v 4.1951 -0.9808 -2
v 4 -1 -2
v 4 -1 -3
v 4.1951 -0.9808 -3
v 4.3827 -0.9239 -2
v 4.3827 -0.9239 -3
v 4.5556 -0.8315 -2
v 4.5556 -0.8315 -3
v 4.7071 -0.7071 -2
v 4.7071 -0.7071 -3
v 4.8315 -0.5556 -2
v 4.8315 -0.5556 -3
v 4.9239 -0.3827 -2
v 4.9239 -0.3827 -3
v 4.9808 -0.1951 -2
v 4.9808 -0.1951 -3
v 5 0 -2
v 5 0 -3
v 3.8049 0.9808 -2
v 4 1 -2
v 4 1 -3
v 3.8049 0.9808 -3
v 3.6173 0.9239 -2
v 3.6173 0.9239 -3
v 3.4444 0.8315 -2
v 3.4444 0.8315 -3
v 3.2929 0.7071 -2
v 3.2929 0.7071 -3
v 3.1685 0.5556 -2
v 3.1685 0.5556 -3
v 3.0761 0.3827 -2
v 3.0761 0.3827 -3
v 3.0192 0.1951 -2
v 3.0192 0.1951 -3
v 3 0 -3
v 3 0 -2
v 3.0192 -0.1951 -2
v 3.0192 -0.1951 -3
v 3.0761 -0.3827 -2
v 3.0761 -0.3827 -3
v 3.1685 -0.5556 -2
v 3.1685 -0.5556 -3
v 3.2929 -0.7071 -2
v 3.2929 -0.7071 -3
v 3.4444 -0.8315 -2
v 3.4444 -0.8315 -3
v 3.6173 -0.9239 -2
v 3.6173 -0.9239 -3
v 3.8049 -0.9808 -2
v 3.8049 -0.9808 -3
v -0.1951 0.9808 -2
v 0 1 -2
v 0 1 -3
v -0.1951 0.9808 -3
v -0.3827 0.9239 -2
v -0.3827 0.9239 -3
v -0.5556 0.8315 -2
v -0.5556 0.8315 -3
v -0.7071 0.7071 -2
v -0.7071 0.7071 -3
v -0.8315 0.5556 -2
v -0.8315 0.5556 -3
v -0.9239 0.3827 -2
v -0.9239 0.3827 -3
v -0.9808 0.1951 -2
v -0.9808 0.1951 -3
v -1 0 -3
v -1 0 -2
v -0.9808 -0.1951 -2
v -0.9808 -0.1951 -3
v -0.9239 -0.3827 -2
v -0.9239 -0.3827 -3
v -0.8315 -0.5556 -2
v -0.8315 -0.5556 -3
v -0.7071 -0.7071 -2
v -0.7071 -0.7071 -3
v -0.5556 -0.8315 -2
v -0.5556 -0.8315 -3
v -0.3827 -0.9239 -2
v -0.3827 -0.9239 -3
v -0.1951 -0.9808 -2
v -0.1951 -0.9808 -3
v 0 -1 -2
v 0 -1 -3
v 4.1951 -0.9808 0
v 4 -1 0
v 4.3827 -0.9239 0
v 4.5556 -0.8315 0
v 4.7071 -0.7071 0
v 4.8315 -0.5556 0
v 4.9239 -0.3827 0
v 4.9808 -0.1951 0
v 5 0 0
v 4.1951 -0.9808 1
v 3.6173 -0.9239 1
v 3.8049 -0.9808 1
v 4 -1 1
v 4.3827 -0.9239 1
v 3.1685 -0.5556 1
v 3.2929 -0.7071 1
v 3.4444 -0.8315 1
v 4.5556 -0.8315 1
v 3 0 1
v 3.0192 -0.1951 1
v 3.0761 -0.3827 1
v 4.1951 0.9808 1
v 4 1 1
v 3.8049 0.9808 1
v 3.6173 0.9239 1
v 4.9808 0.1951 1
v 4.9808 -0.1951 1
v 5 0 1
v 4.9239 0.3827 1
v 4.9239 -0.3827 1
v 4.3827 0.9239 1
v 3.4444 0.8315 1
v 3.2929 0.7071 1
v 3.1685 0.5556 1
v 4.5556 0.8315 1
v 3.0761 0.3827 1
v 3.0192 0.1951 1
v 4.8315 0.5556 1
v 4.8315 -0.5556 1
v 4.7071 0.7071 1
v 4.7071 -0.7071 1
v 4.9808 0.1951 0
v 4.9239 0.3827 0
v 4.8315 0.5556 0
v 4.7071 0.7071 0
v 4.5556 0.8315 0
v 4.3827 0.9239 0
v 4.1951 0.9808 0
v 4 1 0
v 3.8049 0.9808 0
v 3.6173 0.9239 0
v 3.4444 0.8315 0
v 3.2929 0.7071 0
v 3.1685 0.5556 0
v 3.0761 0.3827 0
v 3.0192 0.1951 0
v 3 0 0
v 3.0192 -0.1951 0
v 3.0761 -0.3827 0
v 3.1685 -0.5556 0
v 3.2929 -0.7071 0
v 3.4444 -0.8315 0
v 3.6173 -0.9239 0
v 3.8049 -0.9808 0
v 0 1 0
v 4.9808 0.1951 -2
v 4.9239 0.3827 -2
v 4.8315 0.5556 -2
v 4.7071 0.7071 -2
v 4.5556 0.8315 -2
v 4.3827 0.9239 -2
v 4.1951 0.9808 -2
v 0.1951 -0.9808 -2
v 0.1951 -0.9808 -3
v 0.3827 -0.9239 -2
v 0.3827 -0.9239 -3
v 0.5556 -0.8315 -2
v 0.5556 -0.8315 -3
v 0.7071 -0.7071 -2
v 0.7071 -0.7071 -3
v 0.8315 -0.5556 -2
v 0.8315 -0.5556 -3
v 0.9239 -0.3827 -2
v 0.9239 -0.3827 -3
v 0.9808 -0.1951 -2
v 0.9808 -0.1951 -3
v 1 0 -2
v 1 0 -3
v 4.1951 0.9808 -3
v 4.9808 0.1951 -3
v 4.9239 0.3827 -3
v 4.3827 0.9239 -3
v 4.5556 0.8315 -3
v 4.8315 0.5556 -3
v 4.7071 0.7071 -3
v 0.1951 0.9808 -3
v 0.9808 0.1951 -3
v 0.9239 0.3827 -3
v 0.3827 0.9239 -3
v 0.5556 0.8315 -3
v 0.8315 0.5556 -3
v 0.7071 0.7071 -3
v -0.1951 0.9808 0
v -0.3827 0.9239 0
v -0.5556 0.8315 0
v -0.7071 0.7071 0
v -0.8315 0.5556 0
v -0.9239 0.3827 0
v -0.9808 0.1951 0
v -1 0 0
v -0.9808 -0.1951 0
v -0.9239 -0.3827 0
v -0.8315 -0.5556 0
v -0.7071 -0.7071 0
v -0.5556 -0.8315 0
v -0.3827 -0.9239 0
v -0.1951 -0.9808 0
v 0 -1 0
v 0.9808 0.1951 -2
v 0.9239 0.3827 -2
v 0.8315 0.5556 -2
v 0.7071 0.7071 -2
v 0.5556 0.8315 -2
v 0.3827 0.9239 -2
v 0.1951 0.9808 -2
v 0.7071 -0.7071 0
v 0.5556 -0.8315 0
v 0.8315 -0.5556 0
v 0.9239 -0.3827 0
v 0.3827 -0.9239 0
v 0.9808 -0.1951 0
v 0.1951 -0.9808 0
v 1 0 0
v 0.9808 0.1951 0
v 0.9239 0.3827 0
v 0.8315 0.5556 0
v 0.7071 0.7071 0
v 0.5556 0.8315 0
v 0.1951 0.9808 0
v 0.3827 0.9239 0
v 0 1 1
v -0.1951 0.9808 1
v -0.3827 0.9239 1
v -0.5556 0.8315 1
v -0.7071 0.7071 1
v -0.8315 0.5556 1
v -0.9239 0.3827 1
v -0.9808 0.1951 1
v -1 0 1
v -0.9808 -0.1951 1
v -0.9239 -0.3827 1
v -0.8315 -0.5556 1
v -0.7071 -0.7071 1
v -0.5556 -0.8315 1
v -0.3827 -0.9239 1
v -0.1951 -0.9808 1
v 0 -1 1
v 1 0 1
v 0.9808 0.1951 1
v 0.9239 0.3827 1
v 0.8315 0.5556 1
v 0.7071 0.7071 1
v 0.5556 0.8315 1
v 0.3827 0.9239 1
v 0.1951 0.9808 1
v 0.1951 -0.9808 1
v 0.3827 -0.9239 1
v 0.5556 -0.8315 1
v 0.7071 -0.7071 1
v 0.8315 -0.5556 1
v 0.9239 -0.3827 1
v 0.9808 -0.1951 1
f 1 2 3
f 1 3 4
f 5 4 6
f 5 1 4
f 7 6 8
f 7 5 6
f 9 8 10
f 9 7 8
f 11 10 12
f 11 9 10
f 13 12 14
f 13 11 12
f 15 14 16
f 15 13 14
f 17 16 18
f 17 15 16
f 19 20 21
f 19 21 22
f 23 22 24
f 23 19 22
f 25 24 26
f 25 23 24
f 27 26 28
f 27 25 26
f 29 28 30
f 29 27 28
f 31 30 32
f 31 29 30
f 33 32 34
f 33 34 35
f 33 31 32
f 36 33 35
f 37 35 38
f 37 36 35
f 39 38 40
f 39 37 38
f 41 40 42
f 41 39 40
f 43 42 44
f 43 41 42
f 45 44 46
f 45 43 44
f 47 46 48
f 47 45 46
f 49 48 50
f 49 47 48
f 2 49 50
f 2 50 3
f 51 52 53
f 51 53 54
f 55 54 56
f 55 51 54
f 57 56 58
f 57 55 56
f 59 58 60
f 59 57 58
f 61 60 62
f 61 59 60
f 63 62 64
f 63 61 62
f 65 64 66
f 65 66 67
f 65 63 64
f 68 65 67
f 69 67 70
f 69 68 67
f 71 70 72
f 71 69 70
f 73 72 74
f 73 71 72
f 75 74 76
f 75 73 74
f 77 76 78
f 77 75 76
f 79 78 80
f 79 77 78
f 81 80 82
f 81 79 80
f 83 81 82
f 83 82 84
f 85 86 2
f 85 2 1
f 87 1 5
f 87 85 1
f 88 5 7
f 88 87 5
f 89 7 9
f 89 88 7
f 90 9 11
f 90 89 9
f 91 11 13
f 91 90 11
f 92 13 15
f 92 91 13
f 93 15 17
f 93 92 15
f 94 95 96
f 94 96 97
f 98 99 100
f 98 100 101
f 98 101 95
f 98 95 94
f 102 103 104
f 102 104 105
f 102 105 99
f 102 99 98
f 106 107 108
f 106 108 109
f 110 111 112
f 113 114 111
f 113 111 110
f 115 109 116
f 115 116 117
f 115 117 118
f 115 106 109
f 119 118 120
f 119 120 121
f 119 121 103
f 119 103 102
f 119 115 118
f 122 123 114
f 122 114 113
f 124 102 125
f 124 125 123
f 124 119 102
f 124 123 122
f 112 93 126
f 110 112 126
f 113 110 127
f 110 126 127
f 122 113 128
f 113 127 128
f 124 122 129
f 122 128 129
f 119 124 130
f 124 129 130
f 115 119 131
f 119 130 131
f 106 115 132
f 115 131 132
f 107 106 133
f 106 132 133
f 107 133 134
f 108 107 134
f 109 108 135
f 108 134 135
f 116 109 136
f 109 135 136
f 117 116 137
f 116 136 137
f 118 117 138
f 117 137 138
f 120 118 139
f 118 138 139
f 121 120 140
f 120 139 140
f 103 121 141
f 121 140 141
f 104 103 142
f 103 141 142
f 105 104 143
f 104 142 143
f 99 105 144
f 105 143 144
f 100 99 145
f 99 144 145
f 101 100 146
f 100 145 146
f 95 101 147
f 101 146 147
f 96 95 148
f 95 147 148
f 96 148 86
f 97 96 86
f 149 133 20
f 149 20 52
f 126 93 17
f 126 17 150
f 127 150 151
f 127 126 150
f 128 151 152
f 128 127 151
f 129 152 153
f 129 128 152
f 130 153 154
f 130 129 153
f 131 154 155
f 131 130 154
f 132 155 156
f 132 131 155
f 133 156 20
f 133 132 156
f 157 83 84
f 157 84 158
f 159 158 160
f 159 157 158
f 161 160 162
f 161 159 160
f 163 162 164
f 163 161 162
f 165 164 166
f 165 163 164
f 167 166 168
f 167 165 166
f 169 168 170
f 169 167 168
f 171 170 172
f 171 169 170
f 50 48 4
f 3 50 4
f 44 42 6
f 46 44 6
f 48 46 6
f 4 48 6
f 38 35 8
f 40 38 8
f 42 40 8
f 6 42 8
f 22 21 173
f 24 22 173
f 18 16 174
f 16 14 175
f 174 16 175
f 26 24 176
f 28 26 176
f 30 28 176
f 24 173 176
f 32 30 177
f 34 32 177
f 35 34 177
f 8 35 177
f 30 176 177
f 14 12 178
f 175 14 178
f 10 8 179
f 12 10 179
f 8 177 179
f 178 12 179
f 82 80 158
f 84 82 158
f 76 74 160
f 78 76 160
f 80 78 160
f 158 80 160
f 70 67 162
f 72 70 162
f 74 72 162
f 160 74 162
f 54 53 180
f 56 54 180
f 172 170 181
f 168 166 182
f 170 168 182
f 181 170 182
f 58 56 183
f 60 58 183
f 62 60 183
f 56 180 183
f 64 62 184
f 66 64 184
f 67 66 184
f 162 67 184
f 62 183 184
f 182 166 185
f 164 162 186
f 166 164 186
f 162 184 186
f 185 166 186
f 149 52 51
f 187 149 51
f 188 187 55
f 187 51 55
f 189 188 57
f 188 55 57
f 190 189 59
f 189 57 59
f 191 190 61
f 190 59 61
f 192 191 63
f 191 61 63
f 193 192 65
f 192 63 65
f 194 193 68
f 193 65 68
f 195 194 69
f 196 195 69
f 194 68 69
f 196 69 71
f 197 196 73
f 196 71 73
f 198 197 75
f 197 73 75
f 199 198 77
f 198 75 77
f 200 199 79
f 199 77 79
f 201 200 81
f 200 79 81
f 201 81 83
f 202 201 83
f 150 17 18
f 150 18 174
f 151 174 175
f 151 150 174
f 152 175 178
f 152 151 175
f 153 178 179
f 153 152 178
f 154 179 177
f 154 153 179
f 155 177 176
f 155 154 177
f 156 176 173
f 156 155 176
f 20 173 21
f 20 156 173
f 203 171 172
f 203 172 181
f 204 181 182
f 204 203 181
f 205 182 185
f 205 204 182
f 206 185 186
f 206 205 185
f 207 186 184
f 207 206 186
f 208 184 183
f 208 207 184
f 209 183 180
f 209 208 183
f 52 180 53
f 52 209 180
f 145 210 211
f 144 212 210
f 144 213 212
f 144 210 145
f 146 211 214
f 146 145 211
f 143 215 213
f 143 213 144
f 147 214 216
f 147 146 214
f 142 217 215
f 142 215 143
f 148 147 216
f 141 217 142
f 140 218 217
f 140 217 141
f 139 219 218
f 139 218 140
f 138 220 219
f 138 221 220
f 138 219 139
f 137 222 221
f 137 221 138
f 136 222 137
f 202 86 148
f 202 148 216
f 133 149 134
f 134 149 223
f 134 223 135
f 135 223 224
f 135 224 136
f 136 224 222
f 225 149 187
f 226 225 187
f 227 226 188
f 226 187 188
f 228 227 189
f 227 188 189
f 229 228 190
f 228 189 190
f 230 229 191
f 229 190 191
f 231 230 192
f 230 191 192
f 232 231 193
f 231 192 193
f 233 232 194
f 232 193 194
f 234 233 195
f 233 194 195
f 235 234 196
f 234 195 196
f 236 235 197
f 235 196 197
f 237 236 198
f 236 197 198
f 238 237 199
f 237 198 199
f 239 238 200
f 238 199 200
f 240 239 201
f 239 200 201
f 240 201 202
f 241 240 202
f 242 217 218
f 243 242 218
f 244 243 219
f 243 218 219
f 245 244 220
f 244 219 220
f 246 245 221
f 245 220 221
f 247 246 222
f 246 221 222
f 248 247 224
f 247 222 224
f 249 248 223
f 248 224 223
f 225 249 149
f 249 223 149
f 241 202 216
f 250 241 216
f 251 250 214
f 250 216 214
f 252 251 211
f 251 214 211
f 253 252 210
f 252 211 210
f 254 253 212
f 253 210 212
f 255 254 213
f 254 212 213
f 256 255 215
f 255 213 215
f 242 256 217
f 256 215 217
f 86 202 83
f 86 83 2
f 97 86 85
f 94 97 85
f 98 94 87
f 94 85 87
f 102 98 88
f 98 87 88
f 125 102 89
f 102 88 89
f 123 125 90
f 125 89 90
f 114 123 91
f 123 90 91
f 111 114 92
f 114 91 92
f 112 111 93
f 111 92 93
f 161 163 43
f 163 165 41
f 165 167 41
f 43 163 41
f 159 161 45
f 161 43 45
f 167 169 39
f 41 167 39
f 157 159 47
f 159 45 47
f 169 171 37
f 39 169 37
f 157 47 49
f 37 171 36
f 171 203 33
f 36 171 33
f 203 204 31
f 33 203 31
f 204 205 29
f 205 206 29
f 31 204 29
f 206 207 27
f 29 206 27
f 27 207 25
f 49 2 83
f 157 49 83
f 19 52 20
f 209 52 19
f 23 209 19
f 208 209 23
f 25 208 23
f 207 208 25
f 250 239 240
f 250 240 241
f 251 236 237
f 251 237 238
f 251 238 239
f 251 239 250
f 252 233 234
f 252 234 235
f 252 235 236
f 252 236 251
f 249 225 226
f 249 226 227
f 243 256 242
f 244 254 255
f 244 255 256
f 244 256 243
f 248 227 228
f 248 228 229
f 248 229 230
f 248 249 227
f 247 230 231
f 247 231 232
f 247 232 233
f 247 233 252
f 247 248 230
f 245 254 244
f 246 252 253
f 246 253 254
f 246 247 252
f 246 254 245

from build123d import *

# Parameters (mm, degrees)
EXTRUDE_3_DEPTH      = 2
EXTRUDE_4_DEPTH      = 1
EXTRUDE_4_DEPTH_BACK = 3


with BuildPart() as part:
    # Sketch 1 → Extrude 3 (new body)
    with BuildSketch(Plane.XY):
        with BuildLine():
            ThreePointArc((0, 1), (-1, 0), (0, -1))
            Line((0, -1), (0, 1))
        make_face()
        with BuildLine():
            Line((0, 1), (0, -1))
            ThreePointArc((0, -1), (0.707106781, -0.707106781), (1, 0))
            ThreePointArc((1, 0), (0.707106781, 0.707106781), (0, 1))
        make_face()
        with BuildLine():
            ThreePointArc((0, 1), (-1, 0), (0, -1))
            Line((0, -1), (0, 1))
        make_face()
        with BuildLine():
            Line((0, 1), (0, -1))
            ThreePointArc((0, -1), (0.707106781, -0.707106781), (1, 0))
            ThreePointArc((1, 0), (0.707106781, 0.707106781), (0, 1))
        make_face()
        with BuildLine():
            ThreePointArc((1, 0), (0.707106781, -0.707106781), (0, -1))
            Line((0, -1), (4, -1))
            ThreePointArc((4, -1), (3, 0), (4, 1))
            Line((4, 1), (0, 1))
            ThreePointArc((0, 1), (0.707106781, 0.707106781), (1, 0))
        make_face()
        with BuildLine():
            ThreePointArc((4, 1), (3, 0), (4, -1))
            Line((4, -1), (4, 1))
        make_face()
        with BuildLine():
            Line((4, 1), (4, -1))
            ThreePointArc((4, -1), (4.707106781, -0.707106781), (5, 0))
            ThreePointArc((5, 0), (4.707106781, 0.707106781), (4, 1))
        make_face()
        with BuildLine():
            ThreePointArc((4, 1), (3, 0), (4, -1))
            Line((4, -1), (4, 1))
        make_face()
        with BuildLine():
            Line((4, 1), (4, -1))
            ThreePointArc((4, -1), (4.707106781, -0.707106781), (5, 0))
            ThreePointArc((5, 0), (4.707106781, 0.707106781), (4, 1))
        make_face()
    extrude(amount=-EXTRUDE_3_DEPTH)

    # Sketch 1_7 → Extrude 4 (add, two sides)
    with BuildSketch(Plane.XY) as extrude_4_sk:
        with BuildLine():
            ThreePointArc((0, 1), (-1, 0), (0, -1))
            Line((0, -1), (0, 1))
        make_face()
        with BuildLine():
            Line((0, 1), (0, -1))
            ThreePointArc((0, -1), (0.707106781, -0.707106781), (1, 0))
            ThreePointArc((1, 0), (0.707106781, 0.707106781), (0, 1))
        make_face()
        with BuildLine():
            ThreePointArc((0, 1), (-1, 0), (0, -1))
            Line((0, -1), (0, 1))
        make_face()
        with BuildLine():
            Line((0, 1), (0, -1))
            ThreePointArc((0, -1), (0.707106781, -0.707106781), (1, 0))
            ThreePointArc((1, 0), (0.707106781, 0.707106781), (0, 1))
        make_face()
        with BuildLine():
            ThreePointArc((4, 1), (3, 0), (4, -1))
            Line((4, -1), (4, 1))
        make_face()
        with BuildLine():
            Line((4, 1), (4, -1))
            ThreePointArc((4, -1), (4.707106781, -0.707106781), (5, 0))
            ThreePointArc((5, 0), (4.707106781, 0.707106781), (4, 1))
        make_face()
        with BuildLine():
            ThreePointArc((4, 1), (3, 0), (4, -1))
            Line((4, -1), (4, 1))
        make_face()
        with BuildLine():
            Line((4, 1), (4, -1))
            ThreePointArc((4, -1), (4.707106781, -0.707106781), (5, 0))
            ThreePointArc((5, 0), (4.707106781, 0.707106781), (4, 1))
        make_face()
    extrude(amount=EXTRUDE_4_DEPTH)
    extrude(extrude_4_sk.sketch, amount=-EXTRUDE_4_DEPTH_BACK)


solid = part.part
